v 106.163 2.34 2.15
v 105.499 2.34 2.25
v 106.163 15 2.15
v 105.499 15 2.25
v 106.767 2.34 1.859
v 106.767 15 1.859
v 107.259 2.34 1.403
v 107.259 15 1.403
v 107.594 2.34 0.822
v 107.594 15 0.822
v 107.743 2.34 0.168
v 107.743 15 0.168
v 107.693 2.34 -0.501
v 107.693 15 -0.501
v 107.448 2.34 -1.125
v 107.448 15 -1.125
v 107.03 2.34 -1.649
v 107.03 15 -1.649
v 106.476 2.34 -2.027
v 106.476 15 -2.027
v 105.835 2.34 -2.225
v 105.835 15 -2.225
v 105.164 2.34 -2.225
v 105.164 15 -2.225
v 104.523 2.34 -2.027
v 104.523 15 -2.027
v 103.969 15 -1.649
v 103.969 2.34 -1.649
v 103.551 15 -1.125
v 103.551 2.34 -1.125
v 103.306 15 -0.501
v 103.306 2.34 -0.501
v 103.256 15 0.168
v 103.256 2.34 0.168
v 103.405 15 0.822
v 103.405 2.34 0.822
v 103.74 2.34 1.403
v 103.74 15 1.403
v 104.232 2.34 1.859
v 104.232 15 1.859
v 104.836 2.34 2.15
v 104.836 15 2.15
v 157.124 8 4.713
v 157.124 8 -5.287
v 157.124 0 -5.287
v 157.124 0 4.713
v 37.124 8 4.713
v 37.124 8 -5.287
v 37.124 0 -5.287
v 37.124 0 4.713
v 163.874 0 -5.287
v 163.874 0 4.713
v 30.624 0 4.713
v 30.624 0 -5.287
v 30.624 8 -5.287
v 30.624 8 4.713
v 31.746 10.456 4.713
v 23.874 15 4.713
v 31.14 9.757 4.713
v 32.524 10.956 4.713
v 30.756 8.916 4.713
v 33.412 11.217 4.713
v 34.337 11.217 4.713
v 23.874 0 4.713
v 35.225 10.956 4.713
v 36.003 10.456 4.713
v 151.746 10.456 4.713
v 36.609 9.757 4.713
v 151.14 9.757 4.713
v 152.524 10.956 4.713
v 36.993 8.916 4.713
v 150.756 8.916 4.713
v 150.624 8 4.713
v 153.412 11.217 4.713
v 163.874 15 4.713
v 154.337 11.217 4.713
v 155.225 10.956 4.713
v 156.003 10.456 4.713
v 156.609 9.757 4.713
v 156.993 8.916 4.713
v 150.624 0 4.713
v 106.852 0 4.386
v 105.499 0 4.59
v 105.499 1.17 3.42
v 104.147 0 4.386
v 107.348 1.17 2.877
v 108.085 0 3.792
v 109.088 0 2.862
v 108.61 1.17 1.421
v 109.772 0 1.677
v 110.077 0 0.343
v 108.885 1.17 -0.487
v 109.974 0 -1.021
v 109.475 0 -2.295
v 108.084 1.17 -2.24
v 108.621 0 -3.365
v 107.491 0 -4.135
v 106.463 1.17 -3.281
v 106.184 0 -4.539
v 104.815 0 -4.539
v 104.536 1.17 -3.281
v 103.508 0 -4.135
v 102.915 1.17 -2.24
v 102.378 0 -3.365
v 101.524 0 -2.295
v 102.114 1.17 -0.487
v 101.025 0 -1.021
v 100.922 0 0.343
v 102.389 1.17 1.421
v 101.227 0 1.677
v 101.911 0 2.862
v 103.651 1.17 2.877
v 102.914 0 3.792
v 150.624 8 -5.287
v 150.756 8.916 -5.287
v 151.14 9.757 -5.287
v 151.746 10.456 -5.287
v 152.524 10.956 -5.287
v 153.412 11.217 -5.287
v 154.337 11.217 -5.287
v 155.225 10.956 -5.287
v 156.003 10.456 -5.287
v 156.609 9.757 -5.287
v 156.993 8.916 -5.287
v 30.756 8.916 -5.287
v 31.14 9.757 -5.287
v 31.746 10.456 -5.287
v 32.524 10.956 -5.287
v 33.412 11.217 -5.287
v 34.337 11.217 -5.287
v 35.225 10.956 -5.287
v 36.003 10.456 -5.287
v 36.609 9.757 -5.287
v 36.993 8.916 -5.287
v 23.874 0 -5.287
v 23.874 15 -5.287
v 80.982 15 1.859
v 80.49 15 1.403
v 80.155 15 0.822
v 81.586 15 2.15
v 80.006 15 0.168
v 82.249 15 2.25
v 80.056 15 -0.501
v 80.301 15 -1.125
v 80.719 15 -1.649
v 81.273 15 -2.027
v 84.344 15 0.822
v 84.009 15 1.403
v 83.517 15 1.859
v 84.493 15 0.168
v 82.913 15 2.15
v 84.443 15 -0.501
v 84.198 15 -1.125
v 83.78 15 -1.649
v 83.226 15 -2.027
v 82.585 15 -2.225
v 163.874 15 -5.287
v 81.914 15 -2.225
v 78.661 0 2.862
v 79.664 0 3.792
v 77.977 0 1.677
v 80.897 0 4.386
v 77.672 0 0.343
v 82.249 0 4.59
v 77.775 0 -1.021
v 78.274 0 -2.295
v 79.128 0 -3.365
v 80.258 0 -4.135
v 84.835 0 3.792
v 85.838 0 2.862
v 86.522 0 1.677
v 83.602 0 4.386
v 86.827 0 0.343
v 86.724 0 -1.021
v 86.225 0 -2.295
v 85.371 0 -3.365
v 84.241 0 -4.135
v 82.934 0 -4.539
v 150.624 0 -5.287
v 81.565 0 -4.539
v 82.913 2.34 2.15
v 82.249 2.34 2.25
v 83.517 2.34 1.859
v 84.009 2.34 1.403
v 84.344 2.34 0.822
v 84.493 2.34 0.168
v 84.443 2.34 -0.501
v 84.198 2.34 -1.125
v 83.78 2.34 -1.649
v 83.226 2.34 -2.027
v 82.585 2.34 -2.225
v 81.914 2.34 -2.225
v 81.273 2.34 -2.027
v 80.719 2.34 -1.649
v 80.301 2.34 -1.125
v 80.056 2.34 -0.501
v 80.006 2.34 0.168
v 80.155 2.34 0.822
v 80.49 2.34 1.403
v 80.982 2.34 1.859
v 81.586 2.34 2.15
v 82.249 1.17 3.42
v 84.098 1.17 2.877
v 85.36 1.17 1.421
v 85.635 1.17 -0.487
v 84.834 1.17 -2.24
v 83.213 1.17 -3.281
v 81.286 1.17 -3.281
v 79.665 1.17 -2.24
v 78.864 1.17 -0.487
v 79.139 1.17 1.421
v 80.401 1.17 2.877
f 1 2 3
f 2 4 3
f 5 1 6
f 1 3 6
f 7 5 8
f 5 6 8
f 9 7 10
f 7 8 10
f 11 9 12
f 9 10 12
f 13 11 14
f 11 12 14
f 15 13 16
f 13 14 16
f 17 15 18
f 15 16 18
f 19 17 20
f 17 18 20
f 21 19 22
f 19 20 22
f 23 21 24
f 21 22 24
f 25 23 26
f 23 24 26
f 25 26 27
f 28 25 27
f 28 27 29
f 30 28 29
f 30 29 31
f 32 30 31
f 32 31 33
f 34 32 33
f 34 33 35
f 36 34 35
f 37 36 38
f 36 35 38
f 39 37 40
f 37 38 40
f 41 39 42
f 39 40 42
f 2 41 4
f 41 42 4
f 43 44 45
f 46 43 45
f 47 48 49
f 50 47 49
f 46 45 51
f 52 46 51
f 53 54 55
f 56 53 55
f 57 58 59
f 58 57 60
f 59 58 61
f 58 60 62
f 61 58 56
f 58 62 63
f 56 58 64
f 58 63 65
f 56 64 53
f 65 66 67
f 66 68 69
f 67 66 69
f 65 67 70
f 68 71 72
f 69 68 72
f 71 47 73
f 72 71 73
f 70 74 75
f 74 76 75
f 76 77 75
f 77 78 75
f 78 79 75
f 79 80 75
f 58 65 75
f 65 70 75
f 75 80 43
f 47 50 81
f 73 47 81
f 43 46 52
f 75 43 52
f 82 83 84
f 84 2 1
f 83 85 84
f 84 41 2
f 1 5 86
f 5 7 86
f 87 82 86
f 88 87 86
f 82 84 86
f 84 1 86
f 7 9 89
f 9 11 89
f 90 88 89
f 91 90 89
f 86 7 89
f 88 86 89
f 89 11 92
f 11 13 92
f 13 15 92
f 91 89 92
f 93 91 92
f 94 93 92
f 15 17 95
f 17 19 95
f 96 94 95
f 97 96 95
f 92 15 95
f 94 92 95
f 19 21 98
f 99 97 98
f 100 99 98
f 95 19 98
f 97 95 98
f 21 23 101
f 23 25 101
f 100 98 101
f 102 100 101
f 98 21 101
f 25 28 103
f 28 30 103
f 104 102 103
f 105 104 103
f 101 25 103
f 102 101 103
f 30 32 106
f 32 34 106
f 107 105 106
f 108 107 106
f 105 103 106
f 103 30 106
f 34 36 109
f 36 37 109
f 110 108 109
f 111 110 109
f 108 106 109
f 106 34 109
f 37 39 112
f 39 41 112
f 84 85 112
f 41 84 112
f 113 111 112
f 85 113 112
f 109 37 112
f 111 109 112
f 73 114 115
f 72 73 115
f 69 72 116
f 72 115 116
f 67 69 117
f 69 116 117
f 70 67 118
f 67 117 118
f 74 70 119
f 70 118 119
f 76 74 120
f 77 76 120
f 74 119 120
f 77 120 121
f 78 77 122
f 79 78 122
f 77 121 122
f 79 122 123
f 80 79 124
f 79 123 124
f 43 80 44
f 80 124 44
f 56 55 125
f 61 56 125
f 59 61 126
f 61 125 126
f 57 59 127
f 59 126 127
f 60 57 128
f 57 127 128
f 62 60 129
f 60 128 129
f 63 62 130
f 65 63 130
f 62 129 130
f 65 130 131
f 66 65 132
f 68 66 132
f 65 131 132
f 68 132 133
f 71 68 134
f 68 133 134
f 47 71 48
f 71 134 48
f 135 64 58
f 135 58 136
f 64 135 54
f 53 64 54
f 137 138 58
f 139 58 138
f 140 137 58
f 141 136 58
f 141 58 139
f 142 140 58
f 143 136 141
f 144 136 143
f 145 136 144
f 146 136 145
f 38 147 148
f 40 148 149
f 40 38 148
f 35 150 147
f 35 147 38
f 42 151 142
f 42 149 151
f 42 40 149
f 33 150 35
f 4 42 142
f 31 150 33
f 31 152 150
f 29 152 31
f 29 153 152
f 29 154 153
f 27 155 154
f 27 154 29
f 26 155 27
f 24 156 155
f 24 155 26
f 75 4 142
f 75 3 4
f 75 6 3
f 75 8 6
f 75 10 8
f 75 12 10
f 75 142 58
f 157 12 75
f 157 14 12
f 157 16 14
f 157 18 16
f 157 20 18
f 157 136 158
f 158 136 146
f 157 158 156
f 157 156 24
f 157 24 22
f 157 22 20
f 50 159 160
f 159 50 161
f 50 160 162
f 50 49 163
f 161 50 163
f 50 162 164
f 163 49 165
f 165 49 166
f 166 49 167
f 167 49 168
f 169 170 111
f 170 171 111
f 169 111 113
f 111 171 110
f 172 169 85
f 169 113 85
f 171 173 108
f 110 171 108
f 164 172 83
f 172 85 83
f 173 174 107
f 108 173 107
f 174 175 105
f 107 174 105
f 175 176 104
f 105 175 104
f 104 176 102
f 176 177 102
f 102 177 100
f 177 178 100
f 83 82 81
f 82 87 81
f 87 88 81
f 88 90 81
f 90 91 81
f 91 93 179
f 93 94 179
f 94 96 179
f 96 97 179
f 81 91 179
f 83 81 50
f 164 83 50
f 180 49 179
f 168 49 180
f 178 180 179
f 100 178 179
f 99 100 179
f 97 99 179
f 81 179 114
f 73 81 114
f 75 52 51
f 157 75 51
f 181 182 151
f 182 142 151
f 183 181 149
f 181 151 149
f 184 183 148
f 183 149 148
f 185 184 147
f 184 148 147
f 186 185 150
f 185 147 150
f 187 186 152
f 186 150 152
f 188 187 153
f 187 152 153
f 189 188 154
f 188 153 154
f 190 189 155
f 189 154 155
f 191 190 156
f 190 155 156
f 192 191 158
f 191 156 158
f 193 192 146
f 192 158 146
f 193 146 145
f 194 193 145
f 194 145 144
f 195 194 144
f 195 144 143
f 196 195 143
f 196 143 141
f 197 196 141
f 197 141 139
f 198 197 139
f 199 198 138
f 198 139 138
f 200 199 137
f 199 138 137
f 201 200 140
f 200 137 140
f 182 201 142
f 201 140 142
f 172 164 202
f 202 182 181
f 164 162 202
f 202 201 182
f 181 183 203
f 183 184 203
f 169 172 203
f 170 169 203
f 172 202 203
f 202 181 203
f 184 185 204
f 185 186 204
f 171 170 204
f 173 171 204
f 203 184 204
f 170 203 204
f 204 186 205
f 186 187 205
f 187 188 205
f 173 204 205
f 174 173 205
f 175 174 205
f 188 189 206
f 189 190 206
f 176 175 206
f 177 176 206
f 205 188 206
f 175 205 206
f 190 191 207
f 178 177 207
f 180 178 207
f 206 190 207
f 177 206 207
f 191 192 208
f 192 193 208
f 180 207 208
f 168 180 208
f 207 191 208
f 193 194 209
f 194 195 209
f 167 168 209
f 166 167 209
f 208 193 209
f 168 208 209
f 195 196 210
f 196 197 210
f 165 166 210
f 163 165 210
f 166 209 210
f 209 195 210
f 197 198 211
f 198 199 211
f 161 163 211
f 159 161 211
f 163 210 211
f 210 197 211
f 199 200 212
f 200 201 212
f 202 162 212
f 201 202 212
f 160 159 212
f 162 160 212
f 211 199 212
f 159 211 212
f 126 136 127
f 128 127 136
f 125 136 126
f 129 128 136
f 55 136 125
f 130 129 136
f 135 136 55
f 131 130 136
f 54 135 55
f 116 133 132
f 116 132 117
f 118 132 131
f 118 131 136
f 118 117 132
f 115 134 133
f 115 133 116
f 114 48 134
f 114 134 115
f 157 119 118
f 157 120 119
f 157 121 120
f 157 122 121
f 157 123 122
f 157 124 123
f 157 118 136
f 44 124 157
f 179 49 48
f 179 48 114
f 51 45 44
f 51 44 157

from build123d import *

# Parameters (mm, degrees)
SKIZZE1_W                                            = 140
SKIZZE1_H                                            = 10
AUFSATZ_LINEAR_AUSTRAGEN1_DEPTH                      = 15
SCHNITT_LINEAR_AUSTRAGEN1_DEPTH                      = 15
FORMSENKUNG_F_R_M4_SENKSCHRAUBE_MIT_INNE_D           = 4.5
FORMSENKUNG_F_R_M4_SENKSCHRAUBE_MIT_INNE_CSINK_D     = 9.18
FORMSENKUNG_F_R_M4_SENKSCHRAUBE_MIT_INNE_CSINK_ANGLE = 90


with BuildPart() as part:
    # Skizze1 → Aufsatz-Linear austragen1 (new body)
    with BuildSketch(Plane(origin=(0, 0, 0), x_dir=(1, 0, 0), z_dir=(0, 1, 0))):
        with Locations((93.874498843, 0.286555153)):
            Rectangle(SKIZZE1_W, SKIZZE1_H)
    extrude(amount=AUFSATZ_LINEAR_AUSTRAGEN1_DEPTH)

    # Skizze2 → Schnitt-Linear austragen1 (cut)
    with BuildSketch(Plane(origin=(0, 0, -5.286555153), x_dir=(-1, 0, 0), z_dir=(0, 0, -1))):
        with BuildLine():
            Line((-37.124498843, 8), (-37.124498843, 0))
            Line((-37.124498843, 0), (-30.624498843, 0))
            Line((-30.624498843, 0), (-30.624498843, 8))
            ThreePointArc((-30.624498843, 8), (-33.874498843, 11.25), (-37.124498843, 8))
        make_face()
        with BuildLine():
            Line((-157.124498843, 8), (-157.124498843, -0.120378635))
            Line((-157.124498843, -0.120378635), (-150.624498843, -0.120378635))
            Line((-150.624498843, -0.120378635), (-150.624498843, 8))
            ThreePointArc((-150.624498843, 8), (-153.874498843, 11.25), (-157.124498843, 8))
        make_face()
    extrude(amount=-SCHNITT_LINEAR_AUSTRAGEN1_DEPTH, mode=Mode.SUBTRACT)

    # Formsenkung für M4 Senkschraube mit Innensechskant1 (through all)
    with Locations(Plane(origin=(82.249498843, 0, 0), x_dir=(0, 0, -1), z_dir=(0, -1, 0))):
        with Locations((0, 0), (0, 23.25)):
            CounterSinkHole(FORMSENKUNG_F_R_M4_SENKSCHRAUBE_MIT_INNE_D / 2, FORMSENKUNG_F_R_M4_SENKSCHRAUBE_MIT_INNE_CSINK_D / 2, counter_sink_angle=FORMSENKUNG_F_R_M4_SENKSCHRAUBE_MIT_INNE_CSINK_ANGLE)


solid = part.part
